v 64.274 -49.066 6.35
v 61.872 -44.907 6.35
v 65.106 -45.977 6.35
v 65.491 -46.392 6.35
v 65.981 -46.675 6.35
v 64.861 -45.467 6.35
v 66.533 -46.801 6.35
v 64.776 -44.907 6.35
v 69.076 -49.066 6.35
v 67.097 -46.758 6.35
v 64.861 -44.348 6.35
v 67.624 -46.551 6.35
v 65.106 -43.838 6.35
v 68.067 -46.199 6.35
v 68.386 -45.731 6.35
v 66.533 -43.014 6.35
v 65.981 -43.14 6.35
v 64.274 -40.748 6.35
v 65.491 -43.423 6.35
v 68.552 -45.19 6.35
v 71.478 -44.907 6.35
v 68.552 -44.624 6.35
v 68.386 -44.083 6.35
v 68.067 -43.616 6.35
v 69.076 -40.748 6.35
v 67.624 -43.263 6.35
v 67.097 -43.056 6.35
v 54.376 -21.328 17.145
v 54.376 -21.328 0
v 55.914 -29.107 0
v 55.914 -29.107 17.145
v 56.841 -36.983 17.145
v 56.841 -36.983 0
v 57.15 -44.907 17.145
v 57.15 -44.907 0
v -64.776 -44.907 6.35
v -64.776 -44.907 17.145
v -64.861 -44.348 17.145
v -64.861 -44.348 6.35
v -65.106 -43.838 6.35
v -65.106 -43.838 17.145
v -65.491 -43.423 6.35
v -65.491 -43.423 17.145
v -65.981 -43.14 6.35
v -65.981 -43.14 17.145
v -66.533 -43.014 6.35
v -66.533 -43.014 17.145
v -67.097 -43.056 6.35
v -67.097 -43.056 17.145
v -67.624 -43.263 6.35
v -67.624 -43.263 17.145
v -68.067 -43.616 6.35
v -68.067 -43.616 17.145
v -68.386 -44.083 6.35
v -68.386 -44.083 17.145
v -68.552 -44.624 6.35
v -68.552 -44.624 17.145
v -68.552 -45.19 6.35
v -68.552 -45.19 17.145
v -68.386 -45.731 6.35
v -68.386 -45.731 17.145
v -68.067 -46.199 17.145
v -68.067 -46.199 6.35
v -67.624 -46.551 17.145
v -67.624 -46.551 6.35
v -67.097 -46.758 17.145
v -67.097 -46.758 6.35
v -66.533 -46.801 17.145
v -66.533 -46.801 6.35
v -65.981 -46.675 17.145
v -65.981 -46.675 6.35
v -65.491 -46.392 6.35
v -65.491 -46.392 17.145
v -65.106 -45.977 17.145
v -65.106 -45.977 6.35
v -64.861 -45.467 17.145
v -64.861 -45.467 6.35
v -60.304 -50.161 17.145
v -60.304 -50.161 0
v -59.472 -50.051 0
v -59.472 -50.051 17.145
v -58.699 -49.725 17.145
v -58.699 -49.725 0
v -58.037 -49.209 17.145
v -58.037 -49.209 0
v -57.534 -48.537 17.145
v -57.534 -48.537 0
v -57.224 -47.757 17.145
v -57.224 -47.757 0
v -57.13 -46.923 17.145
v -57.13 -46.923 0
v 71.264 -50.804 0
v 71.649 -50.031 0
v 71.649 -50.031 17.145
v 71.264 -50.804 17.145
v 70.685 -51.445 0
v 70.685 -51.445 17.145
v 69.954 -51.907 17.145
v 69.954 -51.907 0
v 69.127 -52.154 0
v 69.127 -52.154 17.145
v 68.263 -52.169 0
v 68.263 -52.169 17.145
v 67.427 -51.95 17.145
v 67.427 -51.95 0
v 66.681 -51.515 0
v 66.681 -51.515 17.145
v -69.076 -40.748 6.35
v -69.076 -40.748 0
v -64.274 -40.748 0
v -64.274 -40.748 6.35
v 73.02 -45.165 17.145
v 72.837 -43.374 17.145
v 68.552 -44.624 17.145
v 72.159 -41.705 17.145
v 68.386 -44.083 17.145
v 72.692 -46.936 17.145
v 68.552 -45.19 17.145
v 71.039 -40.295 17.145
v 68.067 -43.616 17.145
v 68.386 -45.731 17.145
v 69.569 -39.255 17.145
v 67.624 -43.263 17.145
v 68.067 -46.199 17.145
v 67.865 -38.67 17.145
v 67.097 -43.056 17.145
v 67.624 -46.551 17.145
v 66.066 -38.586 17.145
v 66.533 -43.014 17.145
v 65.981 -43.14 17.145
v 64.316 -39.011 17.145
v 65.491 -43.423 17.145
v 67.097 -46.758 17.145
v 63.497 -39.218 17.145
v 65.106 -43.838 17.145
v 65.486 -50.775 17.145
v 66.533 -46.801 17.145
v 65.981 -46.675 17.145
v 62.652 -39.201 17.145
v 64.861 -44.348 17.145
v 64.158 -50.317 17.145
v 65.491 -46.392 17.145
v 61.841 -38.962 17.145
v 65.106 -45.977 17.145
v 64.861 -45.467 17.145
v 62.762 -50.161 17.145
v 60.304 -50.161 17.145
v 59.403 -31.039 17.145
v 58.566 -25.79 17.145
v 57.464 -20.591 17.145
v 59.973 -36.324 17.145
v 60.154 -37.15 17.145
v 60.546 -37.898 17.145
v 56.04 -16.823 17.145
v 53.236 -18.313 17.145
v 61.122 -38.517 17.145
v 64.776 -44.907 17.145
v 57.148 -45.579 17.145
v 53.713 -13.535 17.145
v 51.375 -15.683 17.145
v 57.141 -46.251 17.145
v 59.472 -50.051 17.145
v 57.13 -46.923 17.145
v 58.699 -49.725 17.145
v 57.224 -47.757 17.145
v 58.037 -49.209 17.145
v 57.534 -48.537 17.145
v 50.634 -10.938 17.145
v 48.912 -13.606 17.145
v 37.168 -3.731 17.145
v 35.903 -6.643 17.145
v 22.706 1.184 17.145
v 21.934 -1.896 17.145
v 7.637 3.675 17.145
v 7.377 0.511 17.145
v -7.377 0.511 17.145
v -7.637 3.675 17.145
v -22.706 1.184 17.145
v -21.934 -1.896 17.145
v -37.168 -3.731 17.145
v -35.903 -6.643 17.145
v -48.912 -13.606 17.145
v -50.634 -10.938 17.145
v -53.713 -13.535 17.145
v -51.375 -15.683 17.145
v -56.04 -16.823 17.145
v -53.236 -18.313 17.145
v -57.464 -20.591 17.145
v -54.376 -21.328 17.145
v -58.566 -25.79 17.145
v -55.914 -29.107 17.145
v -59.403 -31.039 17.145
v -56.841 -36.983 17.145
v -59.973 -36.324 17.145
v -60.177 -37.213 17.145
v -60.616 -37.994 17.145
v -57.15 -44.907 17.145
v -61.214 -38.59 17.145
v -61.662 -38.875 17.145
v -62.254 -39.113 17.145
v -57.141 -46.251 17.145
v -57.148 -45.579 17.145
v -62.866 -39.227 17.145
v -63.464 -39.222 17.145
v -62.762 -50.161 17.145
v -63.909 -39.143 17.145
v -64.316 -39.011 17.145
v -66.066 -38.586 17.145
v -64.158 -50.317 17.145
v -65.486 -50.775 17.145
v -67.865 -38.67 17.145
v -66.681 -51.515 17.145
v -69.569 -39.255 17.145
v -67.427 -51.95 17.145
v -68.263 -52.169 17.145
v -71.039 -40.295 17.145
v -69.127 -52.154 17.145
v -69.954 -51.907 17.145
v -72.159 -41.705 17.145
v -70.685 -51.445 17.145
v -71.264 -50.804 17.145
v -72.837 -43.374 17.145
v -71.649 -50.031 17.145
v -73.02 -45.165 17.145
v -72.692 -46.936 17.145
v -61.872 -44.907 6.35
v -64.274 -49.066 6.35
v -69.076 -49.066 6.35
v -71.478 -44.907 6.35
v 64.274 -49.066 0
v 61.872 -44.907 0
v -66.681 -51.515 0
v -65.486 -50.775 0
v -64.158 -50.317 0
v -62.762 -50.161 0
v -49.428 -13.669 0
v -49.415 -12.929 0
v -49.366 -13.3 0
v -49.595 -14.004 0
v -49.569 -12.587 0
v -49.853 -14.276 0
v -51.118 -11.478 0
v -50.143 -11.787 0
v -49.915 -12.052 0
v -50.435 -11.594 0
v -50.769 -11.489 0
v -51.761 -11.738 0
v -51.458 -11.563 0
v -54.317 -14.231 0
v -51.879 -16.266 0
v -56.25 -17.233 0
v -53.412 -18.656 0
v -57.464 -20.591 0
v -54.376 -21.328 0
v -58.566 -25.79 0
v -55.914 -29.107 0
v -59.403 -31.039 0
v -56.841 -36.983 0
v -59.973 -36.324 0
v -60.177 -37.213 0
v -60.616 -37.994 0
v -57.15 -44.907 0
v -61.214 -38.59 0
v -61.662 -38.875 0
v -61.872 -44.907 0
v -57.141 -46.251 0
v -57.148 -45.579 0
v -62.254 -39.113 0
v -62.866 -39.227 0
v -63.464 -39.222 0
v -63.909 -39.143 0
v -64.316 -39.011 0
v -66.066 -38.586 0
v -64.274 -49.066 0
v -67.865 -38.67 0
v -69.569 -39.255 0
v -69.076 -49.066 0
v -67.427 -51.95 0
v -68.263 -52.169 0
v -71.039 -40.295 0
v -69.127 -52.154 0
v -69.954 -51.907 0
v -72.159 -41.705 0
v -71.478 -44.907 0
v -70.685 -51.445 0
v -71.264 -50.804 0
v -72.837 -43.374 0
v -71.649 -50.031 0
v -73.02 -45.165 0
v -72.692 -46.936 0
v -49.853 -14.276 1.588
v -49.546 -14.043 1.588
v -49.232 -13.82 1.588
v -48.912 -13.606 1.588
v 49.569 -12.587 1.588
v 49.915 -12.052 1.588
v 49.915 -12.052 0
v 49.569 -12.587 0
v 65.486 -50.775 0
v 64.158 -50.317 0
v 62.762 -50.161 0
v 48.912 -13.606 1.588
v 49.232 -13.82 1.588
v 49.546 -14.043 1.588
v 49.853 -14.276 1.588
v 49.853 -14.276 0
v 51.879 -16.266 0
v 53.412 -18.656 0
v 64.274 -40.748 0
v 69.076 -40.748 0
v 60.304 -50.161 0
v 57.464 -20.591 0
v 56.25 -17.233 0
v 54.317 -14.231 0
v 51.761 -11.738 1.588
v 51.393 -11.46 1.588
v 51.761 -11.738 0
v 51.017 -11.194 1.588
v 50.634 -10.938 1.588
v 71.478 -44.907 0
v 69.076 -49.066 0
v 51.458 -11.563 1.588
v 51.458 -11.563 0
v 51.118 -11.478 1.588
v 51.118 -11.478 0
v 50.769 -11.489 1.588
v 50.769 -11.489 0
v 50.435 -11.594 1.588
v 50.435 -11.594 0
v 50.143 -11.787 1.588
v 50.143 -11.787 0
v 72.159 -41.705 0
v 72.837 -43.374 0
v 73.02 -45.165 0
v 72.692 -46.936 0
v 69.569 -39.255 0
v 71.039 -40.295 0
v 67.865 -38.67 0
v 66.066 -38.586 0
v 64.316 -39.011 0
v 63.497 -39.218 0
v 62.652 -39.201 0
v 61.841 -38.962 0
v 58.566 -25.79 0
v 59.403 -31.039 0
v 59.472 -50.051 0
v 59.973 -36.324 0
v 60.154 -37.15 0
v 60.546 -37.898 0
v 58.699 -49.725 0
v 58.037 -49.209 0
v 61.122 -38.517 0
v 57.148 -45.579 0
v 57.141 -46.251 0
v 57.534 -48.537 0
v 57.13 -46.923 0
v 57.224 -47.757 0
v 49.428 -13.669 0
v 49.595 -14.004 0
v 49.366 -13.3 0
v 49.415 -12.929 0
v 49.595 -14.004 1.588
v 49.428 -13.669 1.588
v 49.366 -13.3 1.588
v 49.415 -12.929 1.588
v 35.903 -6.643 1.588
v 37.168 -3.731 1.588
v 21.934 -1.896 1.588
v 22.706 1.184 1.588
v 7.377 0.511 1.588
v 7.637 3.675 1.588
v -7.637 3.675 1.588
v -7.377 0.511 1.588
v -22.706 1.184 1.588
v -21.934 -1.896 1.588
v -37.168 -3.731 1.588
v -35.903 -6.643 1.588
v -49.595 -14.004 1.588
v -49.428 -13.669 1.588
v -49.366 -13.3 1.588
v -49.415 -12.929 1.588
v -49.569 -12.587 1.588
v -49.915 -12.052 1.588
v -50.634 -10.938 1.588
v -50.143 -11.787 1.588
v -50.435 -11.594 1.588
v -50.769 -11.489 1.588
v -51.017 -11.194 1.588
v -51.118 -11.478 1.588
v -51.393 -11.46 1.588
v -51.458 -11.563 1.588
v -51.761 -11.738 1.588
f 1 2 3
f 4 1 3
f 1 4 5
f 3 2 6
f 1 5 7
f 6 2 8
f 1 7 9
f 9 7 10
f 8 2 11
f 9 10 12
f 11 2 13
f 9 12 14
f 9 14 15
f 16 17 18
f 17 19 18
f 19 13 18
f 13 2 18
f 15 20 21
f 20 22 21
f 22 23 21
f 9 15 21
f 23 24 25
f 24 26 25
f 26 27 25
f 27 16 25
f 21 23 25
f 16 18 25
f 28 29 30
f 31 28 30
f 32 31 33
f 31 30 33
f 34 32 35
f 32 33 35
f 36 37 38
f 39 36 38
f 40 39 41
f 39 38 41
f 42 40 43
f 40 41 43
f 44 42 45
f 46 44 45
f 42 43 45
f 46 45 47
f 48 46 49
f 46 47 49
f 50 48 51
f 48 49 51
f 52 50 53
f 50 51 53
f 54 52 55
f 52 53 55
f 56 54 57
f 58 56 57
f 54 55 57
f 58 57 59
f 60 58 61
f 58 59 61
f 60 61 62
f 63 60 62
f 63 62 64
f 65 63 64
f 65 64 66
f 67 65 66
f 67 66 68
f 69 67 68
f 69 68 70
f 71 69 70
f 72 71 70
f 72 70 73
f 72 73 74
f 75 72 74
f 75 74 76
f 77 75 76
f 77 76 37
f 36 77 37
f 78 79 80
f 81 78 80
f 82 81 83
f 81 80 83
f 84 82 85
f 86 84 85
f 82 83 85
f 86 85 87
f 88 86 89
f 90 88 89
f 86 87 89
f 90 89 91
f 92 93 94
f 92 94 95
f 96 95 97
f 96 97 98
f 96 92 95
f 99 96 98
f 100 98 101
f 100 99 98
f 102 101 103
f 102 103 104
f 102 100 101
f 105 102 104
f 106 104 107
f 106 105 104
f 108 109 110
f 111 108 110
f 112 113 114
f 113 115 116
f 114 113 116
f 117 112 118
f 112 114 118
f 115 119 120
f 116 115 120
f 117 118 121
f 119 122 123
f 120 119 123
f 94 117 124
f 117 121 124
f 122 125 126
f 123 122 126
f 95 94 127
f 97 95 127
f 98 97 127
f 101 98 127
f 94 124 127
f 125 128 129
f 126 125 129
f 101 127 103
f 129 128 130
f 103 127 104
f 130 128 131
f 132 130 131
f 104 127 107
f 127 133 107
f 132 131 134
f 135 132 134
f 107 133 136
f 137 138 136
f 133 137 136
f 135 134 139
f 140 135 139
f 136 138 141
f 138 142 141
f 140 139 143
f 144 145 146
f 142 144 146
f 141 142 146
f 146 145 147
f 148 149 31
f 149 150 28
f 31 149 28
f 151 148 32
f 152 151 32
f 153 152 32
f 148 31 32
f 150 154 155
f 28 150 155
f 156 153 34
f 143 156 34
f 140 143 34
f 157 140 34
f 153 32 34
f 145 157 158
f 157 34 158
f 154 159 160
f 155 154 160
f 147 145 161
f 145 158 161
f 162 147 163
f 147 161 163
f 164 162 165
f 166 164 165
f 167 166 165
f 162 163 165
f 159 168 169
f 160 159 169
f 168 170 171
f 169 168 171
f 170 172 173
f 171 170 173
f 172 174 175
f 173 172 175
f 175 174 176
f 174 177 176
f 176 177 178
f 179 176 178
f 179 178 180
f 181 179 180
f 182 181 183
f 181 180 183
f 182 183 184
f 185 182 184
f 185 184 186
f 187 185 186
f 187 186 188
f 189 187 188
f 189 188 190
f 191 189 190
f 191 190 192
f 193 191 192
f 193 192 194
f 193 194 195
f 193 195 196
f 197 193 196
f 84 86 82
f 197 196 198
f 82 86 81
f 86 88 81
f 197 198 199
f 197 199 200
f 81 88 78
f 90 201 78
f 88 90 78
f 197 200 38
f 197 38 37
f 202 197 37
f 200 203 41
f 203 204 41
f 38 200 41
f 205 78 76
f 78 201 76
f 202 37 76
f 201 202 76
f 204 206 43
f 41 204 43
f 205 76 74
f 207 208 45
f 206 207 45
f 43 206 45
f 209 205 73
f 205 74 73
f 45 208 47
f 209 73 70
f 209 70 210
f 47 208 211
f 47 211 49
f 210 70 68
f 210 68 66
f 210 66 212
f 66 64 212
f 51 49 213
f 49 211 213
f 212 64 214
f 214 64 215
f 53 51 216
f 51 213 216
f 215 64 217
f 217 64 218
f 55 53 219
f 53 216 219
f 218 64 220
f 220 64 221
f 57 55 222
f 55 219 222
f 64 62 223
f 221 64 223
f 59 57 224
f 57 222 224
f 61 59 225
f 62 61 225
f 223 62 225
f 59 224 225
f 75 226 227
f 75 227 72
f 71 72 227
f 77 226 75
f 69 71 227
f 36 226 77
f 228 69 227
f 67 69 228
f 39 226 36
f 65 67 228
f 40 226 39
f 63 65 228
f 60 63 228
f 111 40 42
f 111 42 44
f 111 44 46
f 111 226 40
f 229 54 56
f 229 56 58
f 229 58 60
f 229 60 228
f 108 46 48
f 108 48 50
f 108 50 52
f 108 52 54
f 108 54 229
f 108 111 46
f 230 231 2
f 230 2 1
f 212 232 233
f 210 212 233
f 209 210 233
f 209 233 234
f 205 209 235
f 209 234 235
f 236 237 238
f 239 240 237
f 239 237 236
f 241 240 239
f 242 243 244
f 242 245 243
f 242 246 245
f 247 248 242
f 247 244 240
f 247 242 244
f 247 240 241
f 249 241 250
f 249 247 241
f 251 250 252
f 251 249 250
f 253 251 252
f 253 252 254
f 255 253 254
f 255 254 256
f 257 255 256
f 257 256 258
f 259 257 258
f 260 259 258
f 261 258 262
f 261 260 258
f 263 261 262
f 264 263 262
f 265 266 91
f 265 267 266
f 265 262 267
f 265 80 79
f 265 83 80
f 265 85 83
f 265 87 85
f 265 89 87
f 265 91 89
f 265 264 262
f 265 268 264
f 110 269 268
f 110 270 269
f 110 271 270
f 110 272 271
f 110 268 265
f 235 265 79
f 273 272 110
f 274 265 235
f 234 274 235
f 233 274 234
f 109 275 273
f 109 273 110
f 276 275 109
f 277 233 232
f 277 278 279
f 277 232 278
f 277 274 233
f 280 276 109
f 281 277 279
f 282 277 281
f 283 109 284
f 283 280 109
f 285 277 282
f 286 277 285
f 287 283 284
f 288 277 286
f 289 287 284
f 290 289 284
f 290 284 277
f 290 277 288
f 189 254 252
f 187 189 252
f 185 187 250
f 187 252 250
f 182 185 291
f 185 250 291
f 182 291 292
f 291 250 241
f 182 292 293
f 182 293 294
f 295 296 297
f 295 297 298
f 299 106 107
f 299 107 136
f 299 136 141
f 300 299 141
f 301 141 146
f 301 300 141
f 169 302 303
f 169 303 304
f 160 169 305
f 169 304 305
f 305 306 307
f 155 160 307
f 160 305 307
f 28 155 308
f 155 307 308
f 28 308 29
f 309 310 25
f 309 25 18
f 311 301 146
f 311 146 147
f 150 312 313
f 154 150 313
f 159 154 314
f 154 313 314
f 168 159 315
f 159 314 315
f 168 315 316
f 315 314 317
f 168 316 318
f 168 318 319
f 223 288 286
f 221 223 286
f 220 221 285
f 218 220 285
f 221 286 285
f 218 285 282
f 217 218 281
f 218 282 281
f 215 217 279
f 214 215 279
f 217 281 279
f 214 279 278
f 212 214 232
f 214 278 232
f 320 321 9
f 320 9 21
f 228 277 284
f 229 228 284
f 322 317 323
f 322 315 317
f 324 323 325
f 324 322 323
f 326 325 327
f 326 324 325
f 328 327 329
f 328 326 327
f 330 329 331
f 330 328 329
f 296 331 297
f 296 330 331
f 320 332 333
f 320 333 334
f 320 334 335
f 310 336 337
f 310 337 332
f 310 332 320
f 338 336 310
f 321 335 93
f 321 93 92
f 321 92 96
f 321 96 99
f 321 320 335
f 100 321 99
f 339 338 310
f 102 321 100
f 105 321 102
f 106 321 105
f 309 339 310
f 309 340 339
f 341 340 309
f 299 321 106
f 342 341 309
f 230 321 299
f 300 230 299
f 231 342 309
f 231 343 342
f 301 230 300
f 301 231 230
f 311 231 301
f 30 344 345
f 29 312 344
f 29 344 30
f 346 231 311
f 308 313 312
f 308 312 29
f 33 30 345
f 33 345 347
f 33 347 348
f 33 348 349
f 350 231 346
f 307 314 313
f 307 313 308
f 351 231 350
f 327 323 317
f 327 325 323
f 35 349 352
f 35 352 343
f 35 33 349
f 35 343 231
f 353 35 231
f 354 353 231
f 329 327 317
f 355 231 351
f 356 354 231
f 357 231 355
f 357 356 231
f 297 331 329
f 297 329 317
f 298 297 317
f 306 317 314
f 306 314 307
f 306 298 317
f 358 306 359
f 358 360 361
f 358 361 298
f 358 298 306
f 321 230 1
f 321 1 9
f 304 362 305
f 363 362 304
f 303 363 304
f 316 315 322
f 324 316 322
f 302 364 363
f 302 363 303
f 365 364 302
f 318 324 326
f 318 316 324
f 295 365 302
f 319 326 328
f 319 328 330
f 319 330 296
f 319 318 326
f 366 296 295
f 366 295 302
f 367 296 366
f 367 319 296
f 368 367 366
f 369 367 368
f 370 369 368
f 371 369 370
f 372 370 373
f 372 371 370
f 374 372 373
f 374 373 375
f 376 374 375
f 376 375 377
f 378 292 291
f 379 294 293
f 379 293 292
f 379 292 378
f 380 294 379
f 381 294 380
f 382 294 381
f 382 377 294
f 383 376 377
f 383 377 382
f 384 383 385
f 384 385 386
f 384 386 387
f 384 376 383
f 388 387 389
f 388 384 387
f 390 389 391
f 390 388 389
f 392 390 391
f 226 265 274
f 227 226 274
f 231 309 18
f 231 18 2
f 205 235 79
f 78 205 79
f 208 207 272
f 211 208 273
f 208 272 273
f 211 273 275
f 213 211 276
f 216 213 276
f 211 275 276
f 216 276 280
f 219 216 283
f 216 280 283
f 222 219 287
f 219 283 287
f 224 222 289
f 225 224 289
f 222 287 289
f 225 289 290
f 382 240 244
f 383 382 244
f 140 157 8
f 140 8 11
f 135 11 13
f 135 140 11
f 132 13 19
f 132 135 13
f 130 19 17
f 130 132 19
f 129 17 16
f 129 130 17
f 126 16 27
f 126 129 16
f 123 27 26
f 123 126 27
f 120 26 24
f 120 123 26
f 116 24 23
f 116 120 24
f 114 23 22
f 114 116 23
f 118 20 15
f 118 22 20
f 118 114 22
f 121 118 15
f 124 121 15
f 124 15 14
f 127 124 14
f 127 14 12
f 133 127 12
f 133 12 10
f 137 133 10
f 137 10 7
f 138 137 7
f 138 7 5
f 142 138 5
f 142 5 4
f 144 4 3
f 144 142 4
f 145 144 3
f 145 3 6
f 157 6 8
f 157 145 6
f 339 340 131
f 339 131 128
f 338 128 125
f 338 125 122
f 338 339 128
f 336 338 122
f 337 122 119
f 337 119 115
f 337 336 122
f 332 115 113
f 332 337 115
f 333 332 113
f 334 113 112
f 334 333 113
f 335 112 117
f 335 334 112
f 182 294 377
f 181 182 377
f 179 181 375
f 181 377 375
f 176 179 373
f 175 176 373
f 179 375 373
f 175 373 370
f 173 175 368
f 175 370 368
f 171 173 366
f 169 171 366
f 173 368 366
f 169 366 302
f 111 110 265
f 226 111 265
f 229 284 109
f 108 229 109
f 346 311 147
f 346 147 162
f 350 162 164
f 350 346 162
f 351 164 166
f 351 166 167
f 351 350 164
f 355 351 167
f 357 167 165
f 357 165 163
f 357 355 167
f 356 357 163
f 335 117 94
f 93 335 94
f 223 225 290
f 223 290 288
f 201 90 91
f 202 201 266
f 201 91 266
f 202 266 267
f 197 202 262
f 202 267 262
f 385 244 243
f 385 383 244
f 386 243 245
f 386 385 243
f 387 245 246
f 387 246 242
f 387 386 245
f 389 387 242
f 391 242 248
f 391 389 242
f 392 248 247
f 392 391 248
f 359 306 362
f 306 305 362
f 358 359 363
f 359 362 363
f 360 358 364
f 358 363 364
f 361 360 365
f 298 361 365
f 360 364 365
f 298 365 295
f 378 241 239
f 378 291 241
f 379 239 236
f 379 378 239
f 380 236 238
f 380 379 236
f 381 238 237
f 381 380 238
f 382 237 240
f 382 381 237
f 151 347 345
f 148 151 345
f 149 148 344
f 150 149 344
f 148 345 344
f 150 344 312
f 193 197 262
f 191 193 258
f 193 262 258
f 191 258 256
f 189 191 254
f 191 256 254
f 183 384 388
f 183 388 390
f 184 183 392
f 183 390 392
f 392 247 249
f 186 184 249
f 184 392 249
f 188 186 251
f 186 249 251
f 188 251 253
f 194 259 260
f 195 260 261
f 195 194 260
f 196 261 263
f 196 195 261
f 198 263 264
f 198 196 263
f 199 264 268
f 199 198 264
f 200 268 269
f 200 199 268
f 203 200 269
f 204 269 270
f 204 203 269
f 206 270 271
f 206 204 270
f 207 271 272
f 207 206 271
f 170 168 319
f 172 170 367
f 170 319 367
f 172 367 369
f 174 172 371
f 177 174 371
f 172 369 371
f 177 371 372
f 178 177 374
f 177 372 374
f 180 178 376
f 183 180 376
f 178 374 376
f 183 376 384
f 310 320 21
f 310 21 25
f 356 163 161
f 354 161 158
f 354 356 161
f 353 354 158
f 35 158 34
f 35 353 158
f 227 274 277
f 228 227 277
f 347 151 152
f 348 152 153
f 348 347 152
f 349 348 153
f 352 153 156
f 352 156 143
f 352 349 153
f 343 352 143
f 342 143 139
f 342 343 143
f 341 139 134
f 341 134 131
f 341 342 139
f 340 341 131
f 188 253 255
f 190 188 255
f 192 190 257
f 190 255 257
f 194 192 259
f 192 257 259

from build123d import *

# Parameters (mm, degrees)
BOSS_EXTRUDE1_DEPTH   = 17.145
BOSS_EXTRUDE2_START   = -17.145
BOSS_EXTRUDE2_DEPTH   = 17.145
F_6_CLEARANCE_HOLE3_D = 3.7973
CUT_EXTRUDE2_DEPTH    = 6.35
FILLET1_R             = 3.175
CUT_EXTRUDE3_DEPTH    = 1.5875
FILLET2_R             = 1.27


with BuildPart() as part:
    # Sketch1 → Boss-Extrude1 (new body)
    with BuildSketch(Plane.XY):
        with BuildLine():
            Line((-60.325, -44.9072), (-57.15, -44.9072))
            ThreePointArc((-57.15, -44.9072), (-56.454091105, -33.036041743), (-54.37589767, -21.327506412))
            ThreePointArc((-54.37589767, -21.327506412), (-52.38952724, -16.938887877), (-48.911621193, -13.605749768))
            ThreePointArc((-48.911621193, -13.605749768), (0, 0.8128), (48.911621193, -13.605749768))
            ThreePointArc((48.911621193, -13.605749768), (52.38952724, -16.938887877), (54.37589767, -21.327506412))
            ThreePointArc((54.37589767, -21.327506412), (56.454091105, -33.036041743), (57.15, -44.9072))
            Line((57.15, -44.9072), (60.325, -44.9072))
            ThreePointArc((60.325, -44.9072), (59.607343952, -32.665068047), (57.464206972, -20.590640987))
            ThreePointArc((57.464206972, -20.590640987), (54.981243935, -15.104867818), (50.633861375, -10.938445182))
            ThreePointArc((50.633861375, -10.938445182), (0, 3.9878), (-50.633861375, -10.938445182))
            ThreePointArc((-50.633861375, -10.938445182), (-54.981243935, -15.104867818), (-57.464206972, -20.590640987))
            ThreePointArc((-57.464206972, -20.590640987), (-59.607343952, -32.665068047), (-60.325, -44.9072))
        make_face()
    extrude(amount=BOSS_EXTRUDE1_DEPTH)

    # Sketch5 → Boss-Extrude2 (add)
    with BuildSketch(Plane.XY.offset(17.145).offset(BOSS_EXTRUDE2_START)):
        with BuildLine():
            Line((-72.692160527, -46.93606155), (-71.648700283, -50.030736885))
            ThreePointArc((-71.648700283, -50.030736885), (-69.548845385, -52.05848349), (-66.680845425, -51.514679193))
            ThreePointArc((-66.680845425, -51.514679193), (-64.835115794, -50.509265825), (-62.762296236, -50.16142536))
            Line((-62.762296236, -50.16142536), (-60.304367197, -50.16142536))
            ThreePointArc((-60.304367197, -50.16142536), (-58.037136322, -49.209101486), (-57.129992434, -46.923418531))
            ThreePointArc((-57.129992434, -46.923418531), (-57.144997985, -45.9153589), (-57.15, -44.9072))
            Line((-57.15, -44.9072), (-60.325, -44.9072))
            ThreePointArc((-60.325, -44.9072), (-67.702990917, -38.640962319), (-72.692160527, -46.93606155))
        make_face()
    boss_extrude2 = extrude(amount=BOSS_EXTRUDE2_DEPTH)

    # #6 Clearance Hole3 (through all)
    with Locations(Plane(origin=(0, 0, 0), x_dir=(-1, 0, 0), z_dir=(0, 0, -1))):
        with Locations((66.675, -44.9072)):
            f_6_clearance_hole3 = Hole(F_6_CLEARANCE_HOLE3_D / 2)

    # Sketch9 → Cut-Extrude2 (cut)
    with BuildSketch(Plane(origin=(0, 0, 0), x_dir=(-1, 0, 0), z_dir=(0, 0, -1))):
        Polygon((69.076344107, -40.74795), (64.273655893, -40.74795), (61.872311786, -44.9072), (64.273655893, -49.06645), (69.076344107, -49.06645), (71.477688214, -44.9072), align=None)
    cut_extrude2 = extrude(amount=-CUT_EXTRUDE2_DEPTH, mode=Mode.SUBTRACT)

    # Mirror1: Boss-Extrude2, #6 Clearance Hole3, Cut-Extrude2 across plane
    add(boss_extrude2.mirror(Plane(origin=(0, 0, 0), x_dir=(0, 0, 1), z_dir=(1, 0, 0))))
    add(f_6_clearance_hole3.mirror(Plane(origin=(0, 0, 0), x_dir=(0, 0, 1), z_dir=(1, 0, 0))), mode=Mode.SUBTRACT)
    add(cut_extrude2.mirror(Plane(origin=(0, 0, 0), x_dir=(0, 0, 1), z_dir=(1, 0, 0))), mode=Mode.SUBTRACT)

    # Fillet1
    # the kernel refuses this fillet: 3.175 mm, written as the material it adds along each edge
    with BuildSketch(Plane(origin=(60.325, -44.9072, 0), x_dir=(0.5606119105814275, 0.8280786712107985, 0), z_dir=(0, 0, 1))) as fillet1_piece_1:
        with BuildLine():
            CenterArc((8.89971408, 2.629149781), FILLET1_R, 128.797238818, 107.104635177)
            Line((6.910366227, 5.103643693), (6.87057927, 5.153133571))
            ThreePointArc((6.87057927, 5.153133571), (3.469787737, 2.532047093), (-0.035598856, 0.052582996))
            Line((-0.035598856, 0.052582996), (0.035598856, -0.052582996))
            ThreePointArc((0.035598856, -0.052582996), (3.559885632, 1.028200438), (7.084172408, -0.052582996))
            Line((7.084172408, -0.052582996), (7.119771264, 0))
        make_face()
    extrude(amount=17.145)
    fillet1_2_edges = [part.edges().sort_by_distance(p)[0] for p in [
        (-60.325, -44.9072, 8.5725),
    ]]
    fillet(fillet1_2_edges, radius=FILLET1_R)

    # Sketch10 → Cut-Extrude3 (cut)
    with BuildSketch(Plane(origin=(0, 0, 0), x_dir=(-1, 0, 0), z_dir=(0, 0, -1))):
        with BuildLine():
            Line((-50.633861375, -10.938445182), (-48.911621193, -13.605749768))
            ThreePointArc((-48.911621193, -13.605749768), (0, 0.8128), (48.911621193, -13.605749768))
            Line((48.911621193, -13.605749768), (50.633861375, -10.938445182))
            ThreePointArc((50.633861375, -10.938445182), (0, 3.9878), (-50.633861375, -10.938445182))
        make_face()
    extrude(amount=-CUT_EXTRUDE3_DEPTH, mode=Mode.SUBTRACT)

    # Fillet2
    fillet2_edges = [part.edges().sort_by_distance(p)[0] for p in [
        (50.633861375, -10.938445182, 0.79375),
        (-50.633861375, -10.938445182, 0.79375),
        (-48.911621193, -13.605749768, 0.79375),
        (48.911621193, -13.605749768, 0.79375),
    ]]
    fillet(fillet2_edges, radius=FILLET2_R)


solid = part.part
